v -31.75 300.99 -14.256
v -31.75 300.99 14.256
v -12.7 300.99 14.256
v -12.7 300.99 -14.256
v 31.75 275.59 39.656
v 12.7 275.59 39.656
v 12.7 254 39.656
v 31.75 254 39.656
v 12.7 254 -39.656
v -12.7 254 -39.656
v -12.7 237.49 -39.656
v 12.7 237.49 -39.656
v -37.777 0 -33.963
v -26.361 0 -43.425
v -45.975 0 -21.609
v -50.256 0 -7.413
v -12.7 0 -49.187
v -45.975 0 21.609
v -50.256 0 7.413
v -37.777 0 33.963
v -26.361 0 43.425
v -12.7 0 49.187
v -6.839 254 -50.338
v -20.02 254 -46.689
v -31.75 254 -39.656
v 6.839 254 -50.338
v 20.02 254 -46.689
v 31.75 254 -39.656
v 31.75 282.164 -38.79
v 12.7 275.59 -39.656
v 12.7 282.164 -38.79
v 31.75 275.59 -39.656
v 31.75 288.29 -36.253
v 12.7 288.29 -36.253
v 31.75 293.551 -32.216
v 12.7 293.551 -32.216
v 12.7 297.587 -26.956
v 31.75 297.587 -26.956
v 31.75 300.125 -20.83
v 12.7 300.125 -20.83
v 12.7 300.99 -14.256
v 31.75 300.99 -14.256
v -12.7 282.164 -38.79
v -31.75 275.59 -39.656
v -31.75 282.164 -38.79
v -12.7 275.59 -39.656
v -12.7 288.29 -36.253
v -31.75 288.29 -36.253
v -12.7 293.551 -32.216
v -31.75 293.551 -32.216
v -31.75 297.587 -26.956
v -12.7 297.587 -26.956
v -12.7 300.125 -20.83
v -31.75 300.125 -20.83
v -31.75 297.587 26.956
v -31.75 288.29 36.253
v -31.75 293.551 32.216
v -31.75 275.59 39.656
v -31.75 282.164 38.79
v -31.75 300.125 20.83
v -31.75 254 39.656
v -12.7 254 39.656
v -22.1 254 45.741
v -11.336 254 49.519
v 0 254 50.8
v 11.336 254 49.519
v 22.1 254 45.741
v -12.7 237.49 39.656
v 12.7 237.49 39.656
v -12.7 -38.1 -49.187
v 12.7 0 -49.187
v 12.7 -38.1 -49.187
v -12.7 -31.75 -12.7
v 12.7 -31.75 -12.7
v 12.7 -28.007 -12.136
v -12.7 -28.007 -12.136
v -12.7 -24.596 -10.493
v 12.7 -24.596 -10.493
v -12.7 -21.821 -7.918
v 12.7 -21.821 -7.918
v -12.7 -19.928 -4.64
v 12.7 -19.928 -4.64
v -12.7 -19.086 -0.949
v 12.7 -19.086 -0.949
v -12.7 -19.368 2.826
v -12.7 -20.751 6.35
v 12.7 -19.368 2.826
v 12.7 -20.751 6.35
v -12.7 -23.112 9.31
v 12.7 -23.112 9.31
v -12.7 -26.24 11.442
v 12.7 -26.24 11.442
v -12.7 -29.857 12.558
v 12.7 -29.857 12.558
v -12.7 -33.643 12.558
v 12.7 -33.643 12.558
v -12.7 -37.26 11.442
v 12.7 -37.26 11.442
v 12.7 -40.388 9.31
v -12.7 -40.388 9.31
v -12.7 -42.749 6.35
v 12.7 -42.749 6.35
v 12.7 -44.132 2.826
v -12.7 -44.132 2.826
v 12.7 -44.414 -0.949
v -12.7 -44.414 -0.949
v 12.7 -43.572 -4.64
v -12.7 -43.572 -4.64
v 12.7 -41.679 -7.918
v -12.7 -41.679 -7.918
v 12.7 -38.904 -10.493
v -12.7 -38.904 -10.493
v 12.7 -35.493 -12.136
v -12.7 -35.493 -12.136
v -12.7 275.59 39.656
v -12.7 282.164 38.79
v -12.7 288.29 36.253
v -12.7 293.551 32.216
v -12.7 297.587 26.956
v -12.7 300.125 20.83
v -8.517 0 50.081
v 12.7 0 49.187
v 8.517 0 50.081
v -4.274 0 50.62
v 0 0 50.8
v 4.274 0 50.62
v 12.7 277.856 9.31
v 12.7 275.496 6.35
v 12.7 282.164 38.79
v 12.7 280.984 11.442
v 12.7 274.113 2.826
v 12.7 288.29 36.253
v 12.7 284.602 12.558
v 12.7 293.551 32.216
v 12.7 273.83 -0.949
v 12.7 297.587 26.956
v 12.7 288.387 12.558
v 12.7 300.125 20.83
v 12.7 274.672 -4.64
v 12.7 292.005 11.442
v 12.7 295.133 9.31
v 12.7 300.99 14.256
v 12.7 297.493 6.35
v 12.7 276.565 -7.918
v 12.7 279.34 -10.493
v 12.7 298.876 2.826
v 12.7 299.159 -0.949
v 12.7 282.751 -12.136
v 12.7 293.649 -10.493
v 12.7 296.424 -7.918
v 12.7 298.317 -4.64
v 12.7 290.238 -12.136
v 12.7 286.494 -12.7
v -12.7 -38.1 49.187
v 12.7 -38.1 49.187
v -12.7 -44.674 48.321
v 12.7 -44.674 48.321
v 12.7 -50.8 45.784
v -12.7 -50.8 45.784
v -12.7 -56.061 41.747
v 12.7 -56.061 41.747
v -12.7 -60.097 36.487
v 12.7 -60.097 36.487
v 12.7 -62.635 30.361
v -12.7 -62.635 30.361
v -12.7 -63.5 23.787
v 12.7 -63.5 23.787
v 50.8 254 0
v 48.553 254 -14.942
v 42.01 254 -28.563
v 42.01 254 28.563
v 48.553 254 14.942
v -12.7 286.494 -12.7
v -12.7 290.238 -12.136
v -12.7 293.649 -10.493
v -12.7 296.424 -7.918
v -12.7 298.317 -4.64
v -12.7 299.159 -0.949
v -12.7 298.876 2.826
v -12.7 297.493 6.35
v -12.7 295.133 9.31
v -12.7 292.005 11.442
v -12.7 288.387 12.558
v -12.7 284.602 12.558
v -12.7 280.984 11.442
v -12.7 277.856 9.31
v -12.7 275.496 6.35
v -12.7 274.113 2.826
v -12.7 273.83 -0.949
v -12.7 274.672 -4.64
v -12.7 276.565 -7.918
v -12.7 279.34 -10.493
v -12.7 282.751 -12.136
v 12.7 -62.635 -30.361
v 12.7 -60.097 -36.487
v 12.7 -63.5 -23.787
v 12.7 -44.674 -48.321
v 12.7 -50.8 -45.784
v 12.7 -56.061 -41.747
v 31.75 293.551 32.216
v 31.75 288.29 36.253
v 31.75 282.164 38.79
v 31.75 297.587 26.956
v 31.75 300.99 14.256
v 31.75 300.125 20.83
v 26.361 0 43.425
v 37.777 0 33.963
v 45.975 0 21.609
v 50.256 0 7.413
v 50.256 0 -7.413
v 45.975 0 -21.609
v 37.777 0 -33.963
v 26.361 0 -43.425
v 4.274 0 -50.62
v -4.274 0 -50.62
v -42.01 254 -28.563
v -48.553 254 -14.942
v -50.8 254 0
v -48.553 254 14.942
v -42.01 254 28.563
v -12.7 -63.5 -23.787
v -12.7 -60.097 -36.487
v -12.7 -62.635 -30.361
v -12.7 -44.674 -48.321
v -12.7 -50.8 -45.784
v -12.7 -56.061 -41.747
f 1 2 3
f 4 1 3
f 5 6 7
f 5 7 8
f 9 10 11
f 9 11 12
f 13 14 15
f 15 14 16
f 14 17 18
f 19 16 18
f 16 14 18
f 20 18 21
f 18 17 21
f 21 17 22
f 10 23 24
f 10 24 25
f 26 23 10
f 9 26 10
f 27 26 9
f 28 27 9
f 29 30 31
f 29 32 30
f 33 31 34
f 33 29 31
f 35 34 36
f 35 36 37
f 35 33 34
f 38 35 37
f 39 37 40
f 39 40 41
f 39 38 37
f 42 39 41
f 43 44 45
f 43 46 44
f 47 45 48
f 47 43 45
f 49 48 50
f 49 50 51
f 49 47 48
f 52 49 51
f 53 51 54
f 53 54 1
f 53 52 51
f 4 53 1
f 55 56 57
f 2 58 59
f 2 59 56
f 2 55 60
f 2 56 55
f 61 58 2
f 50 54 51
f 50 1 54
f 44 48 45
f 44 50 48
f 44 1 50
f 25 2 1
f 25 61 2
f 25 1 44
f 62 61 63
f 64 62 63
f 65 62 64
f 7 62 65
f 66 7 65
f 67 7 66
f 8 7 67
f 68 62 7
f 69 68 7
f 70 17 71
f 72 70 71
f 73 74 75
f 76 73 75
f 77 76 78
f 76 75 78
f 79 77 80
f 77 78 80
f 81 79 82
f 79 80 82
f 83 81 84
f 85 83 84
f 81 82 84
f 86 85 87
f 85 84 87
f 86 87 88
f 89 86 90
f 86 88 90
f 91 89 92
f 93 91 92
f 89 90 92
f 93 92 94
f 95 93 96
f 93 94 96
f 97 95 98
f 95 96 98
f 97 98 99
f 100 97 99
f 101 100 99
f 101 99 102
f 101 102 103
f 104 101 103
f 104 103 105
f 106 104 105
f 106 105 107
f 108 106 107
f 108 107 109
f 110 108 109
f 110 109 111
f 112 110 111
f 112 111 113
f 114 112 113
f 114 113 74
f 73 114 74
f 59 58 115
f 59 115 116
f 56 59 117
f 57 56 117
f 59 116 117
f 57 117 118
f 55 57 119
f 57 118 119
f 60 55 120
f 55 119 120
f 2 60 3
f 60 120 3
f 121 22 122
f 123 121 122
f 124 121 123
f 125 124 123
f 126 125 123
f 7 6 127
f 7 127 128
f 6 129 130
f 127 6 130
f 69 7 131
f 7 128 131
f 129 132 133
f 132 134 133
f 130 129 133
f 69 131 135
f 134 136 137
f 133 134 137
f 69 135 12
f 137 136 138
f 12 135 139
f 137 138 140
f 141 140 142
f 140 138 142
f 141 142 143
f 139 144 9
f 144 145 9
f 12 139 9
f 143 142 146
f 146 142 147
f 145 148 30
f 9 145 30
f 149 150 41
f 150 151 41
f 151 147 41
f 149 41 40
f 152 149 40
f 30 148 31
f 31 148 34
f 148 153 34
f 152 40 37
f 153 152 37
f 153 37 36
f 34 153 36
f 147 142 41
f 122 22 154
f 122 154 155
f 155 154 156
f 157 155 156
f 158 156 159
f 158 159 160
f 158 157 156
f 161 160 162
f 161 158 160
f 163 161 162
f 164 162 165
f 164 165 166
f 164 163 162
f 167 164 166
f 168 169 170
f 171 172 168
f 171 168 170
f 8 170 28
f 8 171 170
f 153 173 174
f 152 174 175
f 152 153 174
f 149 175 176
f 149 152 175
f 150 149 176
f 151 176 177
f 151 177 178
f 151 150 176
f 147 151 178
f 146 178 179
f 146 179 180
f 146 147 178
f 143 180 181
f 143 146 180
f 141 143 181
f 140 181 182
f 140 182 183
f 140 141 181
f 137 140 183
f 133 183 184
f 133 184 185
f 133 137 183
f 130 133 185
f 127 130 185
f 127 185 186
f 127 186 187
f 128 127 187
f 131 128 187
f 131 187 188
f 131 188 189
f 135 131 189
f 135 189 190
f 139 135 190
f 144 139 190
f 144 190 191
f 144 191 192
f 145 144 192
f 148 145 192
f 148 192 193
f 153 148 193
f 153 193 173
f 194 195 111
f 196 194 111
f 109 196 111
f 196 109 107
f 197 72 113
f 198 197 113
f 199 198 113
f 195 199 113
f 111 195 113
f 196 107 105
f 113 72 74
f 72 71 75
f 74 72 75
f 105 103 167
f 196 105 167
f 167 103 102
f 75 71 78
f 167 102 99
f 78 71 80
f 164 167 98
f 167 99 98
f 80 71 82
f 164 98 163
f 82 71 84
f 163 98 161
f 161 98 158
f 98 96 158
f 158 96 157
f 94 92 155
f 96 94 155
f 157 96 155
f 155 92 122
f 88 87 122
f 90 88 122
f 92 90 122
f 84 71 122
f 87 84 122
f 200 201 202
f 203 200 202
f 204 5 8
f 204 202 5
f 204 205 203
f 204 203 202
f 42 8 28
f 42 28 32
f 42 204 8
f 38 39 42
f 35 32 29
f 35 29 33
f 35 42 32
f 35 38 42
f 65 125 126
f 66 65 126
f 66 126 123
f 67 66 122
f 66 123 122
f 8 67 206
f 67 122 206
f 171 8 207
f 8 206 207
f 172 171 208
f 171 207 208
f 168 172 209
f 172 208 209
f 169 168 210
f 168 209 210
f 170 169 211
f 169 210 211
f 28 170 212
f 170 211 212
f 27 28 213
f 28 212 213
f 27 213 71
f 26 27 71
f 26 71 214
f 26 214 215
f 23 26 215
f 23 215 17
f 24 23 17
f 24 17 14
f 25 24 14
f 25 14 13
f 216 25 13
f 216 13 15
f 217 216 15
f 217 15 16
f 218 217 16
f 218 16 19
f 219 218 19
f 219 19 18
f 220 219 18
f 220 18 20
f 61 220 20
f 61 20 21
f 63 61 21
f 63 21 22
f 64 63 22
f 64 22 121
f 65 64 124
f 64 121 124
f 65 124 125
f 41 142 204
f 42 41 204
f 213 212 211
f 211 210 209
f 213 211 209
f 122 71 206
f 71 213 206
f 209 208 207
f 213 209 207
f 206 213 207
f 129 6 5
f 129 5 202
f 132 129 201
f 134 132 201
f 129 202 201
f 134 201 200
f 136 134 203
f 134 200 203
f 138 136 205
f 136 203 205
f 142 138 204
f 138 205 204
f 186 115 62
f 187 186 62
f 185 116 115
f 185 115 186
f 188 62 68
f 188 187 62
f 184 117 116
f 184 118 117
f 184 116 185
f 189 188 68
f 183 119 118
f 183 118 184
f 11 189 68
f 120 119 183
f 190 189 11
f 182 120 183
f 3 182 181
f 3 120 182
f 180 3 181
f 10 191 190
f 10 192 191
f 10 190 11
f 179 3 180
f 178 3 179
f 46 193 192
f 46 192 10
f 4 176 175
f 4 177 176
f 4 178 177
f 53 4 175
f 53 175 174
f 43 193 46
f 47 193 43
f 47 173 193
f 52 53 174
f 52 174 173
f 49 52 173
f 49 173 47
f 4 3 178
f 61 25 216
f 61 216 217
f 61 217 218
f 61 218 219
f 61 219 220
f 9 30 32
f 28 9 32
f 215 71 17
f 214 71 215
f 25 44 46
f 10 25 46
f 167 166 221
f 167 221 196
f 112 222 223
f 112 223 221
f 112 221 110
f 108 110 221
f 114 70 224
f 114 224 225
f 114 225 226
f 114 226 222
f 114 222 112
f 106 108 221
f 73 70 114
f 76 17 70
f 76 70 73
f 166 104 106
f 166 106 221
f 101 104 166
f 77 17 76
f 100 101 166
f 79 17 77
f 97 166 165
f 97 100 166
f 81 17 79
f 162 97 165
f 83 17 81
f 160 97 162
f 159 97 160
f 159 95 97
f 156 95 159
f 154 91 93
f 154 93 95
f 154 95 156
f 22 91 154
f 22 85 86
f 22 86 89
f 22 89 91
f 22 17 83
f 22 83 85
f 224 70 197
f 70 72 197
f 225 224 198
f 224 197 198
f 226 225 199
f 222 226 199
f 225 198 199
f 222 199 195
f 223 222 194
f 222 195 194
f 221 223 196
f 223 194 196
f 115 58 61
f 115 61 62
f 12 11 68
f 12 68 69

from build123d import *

# Parameters (mm, degrees)
SKETCH1_R           = 50.8
BOSS_EXTRUDE1_DEPTH = 254
SKETCH2_W           = 63.5
SKETCH2_H           = 79.31147458
BOSS_EXTRUDE2_DEPTH = 46.99
SKETCH3_W           = 25.4
SKETCH3_H           = 79.31147458
CUT_EXTRUDE1_DEPTH  = 63.5
FILLET1_R           = 25.4
SKETCH7_W           = 25.4
SKETCH7_H           = 98.373776994
BOSS_EXTRUDE3_DEPTH = 63.5
SKETCH8_R           = 12.7
CUT_EXTRUDE5_DEPTH  = 312.781766786
FILLET2_R           = 25.4
SKETCH6_R           = 12.7
BOSS_EXTRUDE4_DEPTH = 53.34


with BuildPart() as part:
    # Sketch1 → Boss-Extrude1 (new body)
    with BuildSketch(Plane(origin=(0, 0, 0), x_dir=(1, 0, 0), z_dir=(0, 1, 0))):
        with Locations(Location((0, 0, 0), (0, 0, 270))):
            Circle(SKETCH1_R)
    extrude(amount=BOSS_EXTRUDE1_DEPTH)

    # Sketch2 → Boss-Extrude2 (add)
    with BuildSketch(Plane(origin=(0, 254, 0), x_dir=(1, 0, 0), z_dir=(0, 1, 0))):
        Rectangle(SKETCH2_W, SKETCH2_H)
    extrude(amount=BOSS_EXTRUDE2_DEPTH)

    # Sketch3 → Cut-Extrude1 (cut)
    with BuildSketch(Plane(origin=(0, 300.99, 0), x_dir=(1, 0, 0), z_dir=(0, 1, 0))):
        Rectangle(SKETCH3_W, SKETCH3_H)
    extrude(amount=-CUT_EXTRUDE1_DEPTH, mode=Mode.SUBTRACT)

    # Fillet1
    fillet1_edges = [part.edges().sort_by_distance(p)[0] for p in [
        (22.225, 300.99, -39.65573729),
        (-22.225, 300.99, 39.65573729),
        (-22.225, 300.99, -39.65573729),
        (22.225, 300.99, 39.65573729),
    ]]
    fillet(fillet1_edges, radius=FILLET1_R)

    # Sketch7 → Boss-Extrude3 (add)
    with BuildSketch(Plane.XZ):
        Rectangle(SKETCH7_W, SKETCH7_H)
    extrude(amount=BOSS_EXTRUDE3_DEPTH)

    # Sketch8 → Cut-Extrude5 (cut, through all)
    with BuildSketch(Plane(origin=(12.7, 0, 0), x_dir=(0, 0, -1), z_dir=(1, 0, 0))):
        with Locations((0, -31.75)):
            Circle(SKETCH8_R)
    extrude(amount=-CUT_EXTRUDE5_DEPTH, mode=Mode.SUBTRACT)

    # Fillet2
    fillet2_edges = [part.edges().sort_by_distance(p)[0] for p in [
        (0, -63.5, 49.186888497),
        (0, -63.5, -49.186888497),
    ]]
    fillet(fillet2_edges, radius=FILLET2_R)

    # Sketch6 → Boss-Extrude4 (add)
    with BuildSketch(Plane(origin=(31.75, 0, 0), x_dir=(0, 0, -1), z_dir=(1, 0, 0))):
        with Locations((0, 286.494432144)):
            Circle(SKETCH6_R)
    extrude(amount=-BOSS_EXTRUDE4_DEPTH)


solid = part.part
